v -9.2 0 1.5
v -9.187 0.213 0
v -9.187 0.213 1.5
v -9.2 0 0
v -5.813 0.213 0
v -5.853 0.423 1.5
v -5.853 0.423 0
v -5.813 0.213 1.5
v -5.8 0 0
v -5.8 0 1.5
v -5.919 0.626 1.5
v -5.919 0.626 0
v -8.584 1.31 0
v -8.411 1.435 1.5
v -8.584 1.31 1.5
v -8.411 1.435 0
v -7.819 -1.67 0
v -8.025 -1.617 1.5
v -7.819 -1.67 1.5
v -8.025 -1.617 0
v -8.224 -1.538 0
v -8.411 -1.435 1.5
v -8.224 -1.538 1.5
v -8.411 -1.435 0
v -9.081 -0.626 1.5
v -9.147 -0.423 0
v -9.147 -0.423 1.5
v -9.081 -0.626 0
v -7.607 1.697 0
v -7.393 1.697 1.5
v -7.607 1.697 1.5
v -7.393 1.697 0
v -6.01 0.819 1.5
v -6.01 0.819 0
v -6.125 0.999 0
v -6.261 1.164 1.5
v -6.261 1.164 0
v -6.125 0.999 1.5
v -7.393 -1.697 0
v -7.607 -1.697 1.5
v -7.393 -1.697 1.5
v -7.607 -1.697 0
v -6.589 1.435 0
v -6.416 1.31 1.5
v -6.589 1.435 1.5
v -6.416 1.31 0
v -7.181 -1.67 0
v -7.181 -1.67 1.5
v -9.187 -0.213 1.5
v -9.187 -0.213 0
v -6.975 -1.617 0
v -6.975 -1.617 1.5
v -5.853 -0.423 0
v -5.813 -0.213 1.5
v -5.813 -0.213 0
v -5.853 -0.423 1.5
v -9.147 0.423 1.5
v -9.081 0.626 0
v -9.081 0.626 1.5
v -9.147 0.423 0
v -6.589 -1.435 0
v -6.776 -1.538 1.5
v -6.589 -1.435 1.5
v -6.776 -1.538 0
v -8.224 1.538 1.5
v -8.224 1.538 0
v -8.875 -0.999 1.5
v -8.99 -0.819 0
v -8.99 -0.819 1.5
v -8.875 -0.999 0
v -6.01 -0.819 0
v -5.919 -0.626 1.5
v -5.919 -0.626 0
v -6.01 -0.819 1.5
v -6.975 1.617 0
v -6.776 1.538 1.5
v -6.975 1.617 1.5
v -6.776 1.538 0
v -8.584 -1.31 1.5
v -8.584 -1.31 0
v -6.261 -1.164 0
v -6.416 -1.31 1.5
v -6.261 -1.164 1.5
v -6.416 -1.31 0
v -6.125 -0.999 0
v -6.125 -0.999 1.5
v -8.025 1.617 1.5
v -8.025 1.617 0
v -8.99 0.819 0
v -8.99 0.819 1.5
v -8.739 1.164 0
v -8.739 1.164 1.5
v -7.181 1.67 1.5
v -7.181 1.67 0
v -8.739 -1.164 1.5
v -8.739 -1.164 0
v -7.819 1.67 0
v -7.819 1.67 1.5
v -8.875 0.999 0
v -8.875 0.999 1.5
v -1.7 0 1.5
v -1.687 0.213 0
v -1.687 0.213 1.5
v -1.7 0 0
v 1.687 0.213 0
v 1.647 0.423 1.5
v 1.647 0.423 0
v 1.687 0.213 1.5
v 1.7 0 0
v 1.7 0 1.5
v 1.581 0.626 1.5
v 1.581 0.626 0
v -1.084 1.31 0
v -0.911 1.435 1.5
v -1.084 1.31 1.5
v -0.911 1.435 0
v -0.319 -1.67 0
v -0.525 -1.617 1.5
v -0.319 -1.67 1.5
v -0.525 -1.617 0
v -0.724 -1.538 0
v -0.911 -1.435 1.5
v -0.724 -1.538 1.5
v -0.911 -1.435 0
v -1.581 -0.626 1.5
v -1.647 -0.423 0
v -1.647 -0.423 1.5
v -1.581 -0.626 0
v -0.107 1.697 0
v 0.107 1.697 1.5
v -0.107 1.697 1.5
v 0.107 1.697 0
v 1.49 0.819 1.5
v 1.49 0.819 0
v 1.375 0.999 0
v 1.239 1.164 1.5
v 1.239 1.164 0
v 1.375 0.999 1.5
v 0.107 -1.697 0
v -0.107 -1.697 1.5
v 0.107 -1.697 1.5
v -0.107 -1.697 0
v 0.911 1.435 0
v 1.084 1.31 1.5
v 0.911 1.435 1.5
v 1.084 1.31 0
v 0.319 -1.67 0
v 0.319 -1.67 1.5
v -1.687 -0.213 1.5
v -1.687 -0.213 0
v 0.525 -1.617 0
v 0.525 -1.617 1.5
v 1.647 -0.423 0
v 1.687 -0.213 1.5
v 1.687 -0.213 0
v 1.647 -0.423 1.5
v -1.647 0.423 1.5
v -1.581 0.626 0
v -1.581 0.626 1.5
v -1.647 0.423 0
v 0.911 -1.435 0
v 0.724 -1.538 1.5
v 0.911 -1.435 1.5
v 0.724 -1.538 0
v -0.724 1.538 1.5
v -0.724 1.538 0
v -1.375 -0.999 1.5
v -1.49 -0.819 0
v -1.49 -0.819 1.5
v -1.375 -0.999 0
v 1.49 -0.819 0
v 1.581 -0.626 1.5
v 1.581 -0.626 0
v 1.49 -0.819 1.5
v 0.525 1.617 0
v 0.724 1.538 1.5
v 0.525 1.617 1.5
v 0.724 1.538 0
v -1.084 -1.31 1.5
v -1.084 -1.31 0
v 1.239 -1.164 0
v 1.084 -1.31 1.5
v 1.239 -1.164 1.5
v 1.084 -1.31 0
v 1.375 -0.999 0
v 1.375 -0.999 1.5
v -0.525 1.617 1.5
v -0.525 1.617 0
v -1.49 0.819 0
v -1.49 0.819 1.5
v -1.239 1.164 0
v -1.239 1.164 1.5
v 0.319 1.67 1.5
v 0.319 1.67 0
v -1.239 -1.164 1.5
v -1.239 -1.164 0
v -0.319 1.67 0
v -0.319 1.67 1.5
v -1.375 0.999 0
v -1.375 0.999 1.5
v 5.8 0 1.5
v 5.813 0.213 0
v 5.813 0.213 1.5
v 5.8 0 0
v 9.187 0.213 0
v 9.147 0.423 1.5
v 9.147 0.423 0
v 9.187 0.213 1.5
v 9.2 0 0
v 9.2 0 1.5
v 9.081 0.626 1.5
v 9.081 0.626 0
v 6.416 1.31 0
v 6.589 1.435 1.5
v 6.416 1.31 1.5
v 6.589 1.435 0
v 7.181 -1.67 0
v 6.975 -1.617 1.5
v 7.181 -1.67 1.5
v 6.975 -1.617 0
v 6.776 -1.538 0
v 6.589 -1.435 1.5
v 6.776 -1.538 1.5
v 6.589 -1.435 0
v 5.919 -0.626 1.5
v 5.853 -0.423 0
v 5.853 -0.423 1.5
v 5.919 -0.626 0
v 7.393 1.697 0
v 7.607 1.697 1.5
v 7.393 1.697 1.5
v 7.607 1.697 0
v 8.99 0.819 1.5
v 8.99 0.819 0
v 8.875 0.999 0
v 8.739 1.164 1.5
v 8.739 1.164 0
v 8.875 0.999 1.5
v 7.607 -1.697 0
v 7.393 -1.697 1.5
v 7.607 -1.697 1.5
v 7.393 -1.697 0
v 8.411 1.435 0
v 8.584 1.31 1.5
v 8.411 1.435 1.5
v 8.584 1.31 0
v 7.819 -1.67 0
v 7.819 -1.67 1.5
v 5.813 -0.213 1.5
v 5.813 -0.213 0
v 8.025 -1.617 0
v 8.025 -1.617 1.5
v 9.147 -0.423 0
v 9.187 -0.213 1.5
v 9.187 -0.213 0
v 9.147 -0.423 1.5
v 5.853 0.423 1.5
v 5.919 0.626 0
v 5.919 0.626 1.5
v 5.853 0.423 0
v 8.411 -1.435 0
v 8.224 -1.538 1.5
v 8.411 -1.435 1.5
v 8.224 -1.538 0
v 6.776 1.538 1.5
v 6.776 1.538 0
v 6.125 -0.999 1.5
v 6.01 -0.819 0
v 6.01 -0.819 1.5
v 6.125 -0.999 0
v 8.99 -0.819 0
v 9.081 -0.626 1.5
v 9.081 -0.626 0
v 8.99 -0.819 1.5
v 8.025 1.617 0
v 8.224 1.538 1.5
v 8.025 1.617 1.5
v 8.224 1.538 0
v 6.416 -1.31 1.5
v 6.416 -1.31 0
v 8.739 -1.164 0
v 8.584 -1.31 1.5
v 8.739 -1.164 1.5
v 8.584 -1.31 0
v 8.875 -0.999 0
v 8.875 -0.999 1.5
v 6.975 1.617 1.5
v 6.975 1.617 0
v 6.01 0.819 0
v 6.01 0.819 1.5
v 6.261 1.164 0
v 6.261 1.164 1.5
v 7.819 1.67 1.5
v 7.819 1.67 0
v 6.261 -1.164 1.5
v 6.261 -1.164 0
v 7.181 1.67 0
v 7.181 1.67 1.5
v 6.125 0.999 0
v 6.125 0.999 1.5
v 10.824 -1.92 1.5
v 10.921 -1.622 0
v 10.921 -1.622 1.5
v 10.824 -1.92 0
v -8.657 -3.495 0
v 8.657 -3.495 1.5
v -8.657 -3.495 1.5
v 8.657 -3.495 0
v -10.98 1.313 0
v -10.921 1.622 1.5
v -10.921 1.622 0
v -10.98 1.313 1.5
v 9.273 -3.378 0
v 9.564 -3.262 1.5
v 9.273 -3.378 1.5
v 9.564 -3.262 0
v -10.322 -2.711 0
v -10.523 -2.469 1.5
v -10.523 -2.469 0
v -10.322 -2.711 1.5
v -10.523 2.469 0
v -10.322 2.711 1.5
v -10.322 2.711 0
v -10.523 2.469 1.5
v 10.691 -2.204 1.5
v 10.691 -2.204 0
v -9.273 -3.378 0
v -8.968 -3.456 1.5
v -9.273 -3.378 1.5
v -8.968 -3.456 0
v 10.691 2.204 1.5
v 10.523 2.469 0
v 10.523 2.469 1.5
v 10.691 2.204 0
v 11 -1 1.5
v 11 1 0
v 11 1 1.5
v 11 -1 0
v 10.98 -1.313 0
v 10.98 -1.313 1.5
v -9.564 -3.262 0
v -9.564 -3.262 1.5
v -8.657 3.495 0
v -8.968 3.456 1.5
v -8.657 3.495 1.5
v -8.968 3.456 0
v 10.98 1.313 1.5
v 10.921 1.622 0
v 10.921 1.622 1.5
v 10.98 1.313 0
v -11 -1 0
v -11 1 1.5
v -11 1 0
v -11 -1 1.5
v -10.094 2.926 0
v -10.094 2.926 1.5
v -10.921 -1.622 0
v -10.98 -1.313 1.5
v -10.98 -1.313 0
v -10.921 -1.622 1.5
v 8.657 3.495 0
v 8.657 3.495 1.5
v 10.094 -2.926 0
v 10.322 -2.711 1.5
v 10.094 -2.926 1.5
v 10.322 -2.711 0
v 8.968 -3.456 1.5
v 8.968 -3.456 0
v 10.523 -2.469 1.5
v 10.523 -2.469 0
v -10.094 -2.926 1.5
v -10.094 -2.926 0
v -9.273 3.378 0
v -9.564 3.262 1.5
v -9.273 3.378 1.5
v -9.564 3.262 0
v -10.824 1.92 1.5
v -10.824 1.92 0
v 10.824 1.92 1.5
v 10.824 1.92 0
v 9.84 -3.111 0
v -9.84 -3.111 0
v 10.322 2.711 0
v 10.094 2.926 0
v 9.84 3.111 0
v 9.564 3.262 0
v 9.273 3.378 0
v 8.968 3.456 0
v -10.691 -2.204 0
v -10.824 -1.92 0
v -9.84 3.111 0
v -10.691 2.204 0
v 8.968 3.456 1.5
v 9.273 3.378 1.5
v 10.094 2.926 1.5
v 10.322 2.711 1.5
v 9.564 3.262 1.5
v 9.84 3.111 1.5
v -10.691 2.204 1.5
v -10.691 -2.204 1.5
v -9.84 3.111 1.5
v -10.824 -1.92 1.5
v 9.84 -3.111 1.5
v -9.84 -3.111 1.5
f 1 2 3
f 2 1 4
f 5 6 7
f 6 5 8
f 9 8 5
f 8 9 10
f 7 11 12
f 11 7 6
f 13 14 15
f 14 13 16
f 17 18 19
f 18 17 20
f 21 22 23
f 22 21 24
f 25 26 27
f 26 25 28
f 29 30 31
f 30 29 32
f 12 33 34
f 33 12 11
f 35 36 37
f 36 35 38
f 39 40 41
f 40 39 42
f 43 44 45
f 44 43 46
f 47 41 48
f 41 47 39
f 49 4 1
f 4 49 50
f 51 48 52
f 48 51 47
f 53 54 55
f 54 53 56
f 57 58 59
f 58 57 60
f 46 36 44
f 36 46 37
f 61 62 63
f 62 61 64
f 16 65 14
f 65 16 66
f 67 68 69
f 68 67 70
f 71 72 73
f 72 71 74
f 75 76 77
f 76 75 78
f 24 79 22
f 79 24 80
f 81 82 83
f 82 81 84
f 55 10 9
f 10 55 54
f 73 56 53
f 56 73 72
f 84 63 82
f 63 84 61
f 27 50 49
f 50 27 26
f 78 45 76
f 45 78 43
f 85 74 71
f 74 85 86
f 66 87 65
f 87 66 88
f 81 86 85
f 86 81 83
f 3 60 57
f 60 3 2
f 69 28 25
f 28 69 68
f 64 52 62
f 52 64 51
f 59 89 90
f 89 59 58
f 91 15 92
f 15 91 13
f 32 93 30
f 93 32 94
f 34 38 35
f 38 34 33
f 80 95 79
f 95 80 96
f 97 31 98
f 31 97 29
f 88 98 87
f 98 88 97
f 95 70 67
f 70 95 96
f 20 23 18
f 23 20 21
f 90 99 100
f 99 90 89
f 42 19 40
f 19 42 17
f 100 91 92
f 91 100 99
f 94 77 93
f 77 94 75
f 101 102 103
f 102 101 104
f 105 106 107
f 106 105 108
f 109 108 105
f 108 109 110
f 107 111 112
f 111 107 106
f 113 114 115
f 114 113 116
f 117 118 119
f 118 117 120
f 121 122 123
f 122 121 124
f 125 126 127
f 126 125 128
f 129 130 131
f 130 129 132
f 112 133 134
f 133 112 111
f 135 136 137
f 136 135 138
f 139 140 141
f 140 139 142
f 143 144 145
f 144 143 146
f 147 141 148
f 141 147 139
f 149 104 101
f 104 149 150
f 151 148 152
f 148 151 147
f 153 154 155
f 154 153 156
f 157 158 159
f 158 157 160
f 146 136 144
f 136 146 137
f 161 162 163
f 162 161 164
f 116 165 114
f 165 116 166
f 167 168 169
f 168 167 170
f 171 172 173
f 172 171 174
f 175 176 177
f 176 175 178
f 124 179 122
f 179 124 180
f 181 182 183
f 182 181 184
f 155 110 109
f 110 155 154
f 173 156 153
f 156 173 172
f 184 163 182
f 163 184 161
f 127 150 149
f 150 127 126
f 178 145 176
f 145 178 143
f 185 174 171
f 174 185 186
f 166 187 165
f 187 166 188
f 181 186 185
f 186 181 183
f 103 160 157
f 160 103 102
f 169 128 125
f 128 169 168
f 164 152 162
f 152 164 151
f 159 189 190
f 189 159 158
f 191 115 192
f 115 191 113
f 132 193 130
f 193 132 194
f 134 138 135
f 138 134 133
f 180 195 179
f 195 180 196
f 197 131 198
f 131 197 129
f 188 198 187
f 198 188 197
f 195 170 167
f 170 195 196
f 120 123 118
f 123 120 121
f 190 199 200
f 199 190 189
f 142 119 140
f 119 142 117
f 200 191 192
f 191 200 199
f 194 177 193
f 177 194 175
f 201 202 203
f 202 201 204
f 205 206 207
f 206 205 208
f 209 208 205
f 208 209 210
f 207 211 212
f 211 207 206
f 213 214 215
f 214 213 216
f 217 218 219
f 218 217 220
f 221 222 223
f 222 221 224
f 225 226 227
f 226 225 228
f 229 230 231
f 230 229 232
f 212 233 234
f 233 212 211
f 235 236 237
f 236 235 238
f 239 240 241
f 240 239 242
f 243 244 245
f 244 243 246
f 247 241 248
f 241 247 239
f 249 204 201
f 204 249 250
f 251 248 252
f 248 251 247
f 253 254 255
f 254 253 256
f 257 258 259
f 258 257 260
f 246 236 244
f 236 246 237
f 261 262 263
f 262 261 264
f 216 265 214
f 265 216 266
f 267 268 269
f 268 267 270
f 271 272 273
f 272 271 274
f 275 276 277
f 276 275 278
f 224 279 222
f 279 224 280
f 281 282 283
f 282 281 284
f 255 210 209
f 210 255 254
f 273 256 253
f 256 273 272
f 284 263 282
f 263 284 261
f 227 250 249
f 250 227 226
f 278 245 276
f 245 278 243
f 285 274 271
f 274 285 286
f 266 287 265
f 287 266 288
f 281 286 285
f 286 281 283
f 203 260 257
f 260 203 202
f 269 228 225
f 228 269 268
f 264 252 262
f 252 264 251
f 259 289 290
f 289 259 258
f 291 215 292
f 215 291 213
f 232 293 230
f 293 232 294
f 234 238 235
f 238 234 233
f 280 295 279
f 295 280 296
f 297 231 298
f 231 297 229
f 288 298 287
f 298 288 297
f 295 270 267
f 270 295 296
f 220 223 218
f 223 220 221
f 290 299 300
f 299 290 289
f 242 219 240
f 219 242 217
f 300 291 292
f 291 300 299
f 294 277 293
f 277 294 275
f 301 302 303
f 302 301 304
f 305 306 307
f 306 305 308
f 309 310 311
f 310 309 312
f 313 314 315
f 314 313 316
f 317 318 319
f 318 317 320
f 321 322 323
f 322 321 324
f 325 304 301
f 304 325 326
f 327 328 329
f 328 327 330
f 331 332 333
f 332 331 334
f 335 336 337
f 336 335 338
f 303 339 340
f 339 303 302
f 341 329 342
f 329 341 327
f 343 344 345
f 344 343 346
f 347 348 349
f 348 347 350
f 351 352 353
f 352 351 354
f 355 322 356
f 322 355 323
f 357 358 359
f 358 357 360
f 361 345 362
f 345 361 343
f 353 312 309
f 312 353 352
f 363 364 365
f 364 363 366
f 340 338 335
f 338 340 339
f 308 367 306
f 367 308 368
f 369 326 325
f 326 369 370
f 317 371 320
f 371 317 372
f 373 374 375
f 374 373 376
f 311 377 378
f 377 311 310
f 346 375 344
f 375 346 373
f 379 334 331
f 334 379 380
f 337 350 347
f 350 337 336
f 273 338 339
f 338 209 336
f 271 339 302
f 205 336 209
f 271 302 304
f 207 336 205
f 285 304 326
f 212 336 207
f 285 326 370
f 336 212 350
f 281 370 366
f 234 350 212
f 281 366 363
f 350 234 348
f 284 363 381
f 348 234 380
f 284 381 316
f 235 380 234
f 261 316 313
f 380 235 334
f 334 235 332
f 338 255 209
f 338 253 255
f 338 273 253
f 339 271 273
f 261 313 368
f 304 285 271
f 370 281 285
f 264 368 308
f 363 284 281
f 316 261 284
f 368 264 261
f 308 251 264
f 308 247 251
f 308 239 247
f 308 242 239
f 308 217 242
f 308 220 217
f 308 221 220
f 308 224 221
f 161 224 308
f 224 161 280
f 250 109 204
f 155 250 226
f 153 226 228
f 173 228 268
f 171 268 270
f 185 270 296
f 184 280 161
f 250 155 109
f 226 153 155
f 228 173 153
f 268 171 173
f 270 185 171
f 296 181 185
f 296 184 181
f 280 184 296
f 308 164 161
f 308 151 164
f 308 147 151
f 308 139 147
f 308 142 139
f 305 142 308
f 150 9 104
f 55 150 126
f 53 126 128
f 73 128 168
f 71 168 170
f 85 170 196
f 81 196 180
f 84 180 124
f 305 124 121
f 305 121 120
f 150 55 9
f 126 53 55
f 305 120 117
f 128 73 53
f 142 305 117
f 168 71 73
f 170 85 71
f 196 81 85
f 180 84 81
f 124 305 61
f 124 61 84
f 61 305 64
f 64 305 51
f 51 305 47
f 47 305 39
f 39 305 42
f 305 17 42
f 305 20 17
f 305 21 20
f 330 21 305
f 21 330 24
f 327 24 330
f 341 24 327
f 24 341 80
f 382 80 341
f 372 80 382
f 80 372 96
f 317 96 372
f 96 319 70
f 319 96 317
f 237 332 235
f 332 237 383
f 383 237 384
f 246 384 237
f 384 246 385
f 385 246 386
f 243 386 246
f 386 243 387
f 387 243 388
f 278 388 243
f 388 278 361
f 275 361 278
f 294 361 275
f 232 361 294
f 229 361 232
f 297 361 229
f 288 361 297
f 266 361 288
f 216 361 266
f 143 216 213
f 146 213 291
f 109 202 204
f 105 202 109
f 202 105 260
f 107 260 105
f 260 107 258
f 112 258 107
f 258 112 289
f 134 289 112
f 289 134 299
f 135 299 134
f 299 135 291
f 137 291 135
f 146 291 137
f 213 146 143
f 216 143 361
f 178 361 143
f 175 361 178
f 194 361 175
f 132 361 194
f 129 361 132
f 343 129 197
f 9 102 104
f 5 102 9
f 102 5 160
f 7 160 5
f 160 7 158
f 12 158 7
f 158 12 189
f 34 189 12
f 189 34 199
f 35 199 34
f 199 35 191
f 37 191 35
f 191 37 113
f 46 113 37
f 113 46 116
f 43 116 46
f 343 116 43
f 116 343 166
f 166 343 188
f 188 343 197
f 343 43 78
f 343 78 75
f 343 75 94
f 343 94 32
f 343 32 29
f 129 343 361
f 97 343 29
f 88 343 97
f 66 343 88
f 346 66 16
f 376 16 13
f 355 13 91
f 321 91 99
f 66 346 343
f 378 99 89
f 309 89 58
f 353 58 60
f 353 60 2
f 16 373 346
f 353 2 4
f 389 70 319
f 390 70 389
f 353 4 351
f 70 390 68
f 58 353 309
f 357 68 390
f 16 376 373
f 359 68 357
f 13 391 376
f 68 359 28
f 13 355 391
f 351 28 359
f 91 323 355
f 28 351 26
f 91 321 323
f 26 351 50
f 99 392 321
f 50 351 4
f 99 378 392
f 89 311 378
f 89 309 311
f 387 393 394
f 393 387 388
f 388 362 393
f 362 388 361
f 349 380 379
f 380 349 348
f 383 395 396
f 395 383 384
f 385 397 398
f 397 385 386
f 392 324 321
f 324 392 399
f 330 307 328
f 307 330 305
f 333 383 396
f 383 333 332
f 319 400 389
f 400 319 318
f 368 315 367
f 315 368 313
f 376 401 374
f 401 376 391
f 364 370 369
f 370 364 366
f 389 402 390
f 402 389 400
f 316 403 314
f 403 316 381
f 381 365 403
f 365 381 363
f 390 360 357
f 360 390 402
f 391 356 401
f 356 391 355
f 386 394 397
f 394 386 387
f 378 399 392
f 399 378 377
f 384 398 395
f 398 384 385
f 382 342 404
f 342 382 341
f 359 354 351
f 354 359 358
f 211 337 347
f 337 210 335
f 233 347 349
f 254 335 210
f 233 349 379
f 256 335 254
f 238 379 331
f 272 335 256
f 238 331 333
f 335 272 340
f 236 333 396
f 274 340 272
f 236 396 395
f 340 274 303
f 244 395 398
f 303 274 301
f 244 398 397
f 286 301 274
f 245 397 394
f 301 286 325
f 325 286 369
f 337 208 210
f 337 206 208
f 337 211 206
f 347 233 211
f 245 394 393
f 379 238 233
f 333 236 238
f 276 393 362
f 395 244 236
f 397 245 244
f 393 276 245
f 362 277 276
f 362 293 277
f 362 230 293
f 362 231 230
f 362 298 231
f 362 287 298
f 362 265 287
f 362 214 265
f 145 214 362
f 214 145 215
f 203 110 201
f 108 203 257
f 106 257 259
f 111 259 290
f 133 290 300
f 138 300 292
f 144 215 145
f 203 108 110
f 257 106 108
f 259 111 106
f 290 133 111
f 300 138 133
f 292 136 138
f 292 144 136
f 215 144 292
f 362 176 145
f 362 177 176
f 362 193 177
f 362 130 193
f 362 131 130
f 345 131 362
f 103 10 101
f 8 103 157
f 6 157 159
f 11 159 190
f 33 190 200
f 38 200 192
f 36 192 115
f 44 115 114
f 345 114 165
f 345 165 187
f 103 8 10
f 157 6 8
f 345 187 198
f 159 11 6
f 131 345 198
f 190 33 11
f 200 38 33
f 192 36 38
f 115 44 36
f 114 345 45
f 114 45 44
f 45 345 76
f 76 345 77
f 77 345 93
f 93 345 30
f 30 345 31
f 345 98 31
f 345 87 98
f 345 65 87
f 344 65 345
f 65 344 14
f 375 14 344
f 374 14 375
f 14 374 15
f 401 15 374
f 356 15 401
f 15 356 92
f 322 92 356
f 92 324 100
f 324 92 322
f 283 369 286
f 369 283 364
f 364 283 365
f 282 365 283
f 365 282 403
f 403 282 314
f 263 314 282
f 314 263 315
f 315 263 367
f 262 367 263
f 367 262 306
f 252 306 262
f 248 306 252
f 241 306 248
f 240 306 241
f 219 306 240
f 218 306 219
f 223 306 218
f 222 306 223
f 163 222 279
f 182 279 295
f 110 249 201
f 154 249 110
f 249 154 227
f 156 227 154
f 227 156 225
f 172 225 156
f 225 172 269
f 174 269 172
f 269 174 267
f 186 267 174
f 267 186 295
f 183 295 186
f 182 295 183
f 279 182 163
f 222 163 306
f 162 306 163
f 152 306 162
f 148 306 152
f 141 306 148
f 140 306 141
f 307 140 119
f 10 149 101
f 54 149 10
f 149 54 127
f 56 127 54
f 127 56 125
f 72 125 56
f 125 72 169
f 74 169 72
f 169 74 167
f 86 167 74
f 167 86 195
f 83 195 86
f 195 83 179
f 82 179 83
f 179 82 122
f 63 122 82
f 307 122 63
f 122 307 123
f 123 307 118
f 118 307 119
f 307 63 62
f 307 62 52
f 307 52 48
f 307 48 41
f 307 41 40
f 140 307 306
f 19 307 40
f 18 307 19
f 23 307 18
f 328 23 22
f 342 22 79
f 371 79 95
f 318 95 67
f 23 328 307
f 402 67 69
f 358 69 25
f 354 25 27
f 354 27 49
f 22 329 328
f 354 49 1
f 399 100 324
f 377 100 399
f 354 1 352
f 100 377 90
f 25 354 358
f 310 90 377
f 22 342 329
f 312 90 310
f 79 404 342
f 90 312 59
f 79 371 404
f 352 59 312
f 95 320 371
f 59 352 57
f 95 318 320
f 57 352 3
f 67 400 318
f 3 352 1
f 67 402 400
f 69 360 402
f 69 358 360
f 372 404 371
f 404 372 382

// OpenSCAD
$fn = 50;


difference() {
	union() {
		translate(v = [0, 0, 0]) {
			rotate(a = [0, 0, 0]) {
				hull() {
					translate(v = [-8.5000000000, 1.0000000000, 0]) {
						rotate(a = [0, 0, 0]) {
							translate(v = [0, 0, 0]) {
								rotate(a = [0, 0, 0]) {
									cylinder(h = 1.5000000000, r = 2.5000000000);
								}
							}
						}
					}
					translate(v = [8.5000000000, 1.0000000000, 0]) {
						rotate(a = [0, 0, 0]) {
							translate(v = [0, 0, 0]) {
								rotate(a = [0, 0, 0]) {
									cylinder(h = 1.5000000000, r = 2.5000000000);
								}
							}
						}
					}
					translate(v = [-8.5000000000, -1.0000000000, 0]) {
						rotate(a = [0, 0, 0]) {
							translate(v = [0, 0, 0]) {
								rotate(a = [0, 0, 0]) {
									cylinder(h = 1.5000000000, r = 2.5000000000);
								}
							}
						}
					}
					translate(v = [8.5000000000, -1.0000000000, 0]) {
						rotate(a = [0, 0, 0]) {
							translate(v = [0, 0, 0]) {
								rotate(a = [0, 0, 0]) {
									cylinder(h = 1.5000000000, r = 2.5000000000);
								}
							}
						}
					}
				}
			}
		}
	}
	union() {
		translate(v = [-7.5000000000, 0.0000000000, 0]) {
			rotate(a = [0, 0, 0]) {
				translate(v = [0, 0, -50]) {
					rotate(a = [0, 0, 0]) {
						cylinder(h = 100, r = 1.7000000000);
					}
				}
			}
		}
		translate(v = [0.0000000000, 0.0000000000, 0]) {
			rotate(a = [0, 0, 0]) {
				translate(v = [0, 0, -50]) {
					rotate(a = [0, 0, 0]) {
						cylinder(h = 100, r = 1.7000000000);
					}
				}
			}
		}
		translate(v = [7.5000000000, 0.0000000000, 0]) {
			rotate(a = [0, 0, 0]) {
				translate(v = [0, 0, -50]) {
					rotate(a = [0, 0, 0]) {
						cylinder(h = 100, r = 1.7000000000);
					}
				}
			}
		}
	}
}
